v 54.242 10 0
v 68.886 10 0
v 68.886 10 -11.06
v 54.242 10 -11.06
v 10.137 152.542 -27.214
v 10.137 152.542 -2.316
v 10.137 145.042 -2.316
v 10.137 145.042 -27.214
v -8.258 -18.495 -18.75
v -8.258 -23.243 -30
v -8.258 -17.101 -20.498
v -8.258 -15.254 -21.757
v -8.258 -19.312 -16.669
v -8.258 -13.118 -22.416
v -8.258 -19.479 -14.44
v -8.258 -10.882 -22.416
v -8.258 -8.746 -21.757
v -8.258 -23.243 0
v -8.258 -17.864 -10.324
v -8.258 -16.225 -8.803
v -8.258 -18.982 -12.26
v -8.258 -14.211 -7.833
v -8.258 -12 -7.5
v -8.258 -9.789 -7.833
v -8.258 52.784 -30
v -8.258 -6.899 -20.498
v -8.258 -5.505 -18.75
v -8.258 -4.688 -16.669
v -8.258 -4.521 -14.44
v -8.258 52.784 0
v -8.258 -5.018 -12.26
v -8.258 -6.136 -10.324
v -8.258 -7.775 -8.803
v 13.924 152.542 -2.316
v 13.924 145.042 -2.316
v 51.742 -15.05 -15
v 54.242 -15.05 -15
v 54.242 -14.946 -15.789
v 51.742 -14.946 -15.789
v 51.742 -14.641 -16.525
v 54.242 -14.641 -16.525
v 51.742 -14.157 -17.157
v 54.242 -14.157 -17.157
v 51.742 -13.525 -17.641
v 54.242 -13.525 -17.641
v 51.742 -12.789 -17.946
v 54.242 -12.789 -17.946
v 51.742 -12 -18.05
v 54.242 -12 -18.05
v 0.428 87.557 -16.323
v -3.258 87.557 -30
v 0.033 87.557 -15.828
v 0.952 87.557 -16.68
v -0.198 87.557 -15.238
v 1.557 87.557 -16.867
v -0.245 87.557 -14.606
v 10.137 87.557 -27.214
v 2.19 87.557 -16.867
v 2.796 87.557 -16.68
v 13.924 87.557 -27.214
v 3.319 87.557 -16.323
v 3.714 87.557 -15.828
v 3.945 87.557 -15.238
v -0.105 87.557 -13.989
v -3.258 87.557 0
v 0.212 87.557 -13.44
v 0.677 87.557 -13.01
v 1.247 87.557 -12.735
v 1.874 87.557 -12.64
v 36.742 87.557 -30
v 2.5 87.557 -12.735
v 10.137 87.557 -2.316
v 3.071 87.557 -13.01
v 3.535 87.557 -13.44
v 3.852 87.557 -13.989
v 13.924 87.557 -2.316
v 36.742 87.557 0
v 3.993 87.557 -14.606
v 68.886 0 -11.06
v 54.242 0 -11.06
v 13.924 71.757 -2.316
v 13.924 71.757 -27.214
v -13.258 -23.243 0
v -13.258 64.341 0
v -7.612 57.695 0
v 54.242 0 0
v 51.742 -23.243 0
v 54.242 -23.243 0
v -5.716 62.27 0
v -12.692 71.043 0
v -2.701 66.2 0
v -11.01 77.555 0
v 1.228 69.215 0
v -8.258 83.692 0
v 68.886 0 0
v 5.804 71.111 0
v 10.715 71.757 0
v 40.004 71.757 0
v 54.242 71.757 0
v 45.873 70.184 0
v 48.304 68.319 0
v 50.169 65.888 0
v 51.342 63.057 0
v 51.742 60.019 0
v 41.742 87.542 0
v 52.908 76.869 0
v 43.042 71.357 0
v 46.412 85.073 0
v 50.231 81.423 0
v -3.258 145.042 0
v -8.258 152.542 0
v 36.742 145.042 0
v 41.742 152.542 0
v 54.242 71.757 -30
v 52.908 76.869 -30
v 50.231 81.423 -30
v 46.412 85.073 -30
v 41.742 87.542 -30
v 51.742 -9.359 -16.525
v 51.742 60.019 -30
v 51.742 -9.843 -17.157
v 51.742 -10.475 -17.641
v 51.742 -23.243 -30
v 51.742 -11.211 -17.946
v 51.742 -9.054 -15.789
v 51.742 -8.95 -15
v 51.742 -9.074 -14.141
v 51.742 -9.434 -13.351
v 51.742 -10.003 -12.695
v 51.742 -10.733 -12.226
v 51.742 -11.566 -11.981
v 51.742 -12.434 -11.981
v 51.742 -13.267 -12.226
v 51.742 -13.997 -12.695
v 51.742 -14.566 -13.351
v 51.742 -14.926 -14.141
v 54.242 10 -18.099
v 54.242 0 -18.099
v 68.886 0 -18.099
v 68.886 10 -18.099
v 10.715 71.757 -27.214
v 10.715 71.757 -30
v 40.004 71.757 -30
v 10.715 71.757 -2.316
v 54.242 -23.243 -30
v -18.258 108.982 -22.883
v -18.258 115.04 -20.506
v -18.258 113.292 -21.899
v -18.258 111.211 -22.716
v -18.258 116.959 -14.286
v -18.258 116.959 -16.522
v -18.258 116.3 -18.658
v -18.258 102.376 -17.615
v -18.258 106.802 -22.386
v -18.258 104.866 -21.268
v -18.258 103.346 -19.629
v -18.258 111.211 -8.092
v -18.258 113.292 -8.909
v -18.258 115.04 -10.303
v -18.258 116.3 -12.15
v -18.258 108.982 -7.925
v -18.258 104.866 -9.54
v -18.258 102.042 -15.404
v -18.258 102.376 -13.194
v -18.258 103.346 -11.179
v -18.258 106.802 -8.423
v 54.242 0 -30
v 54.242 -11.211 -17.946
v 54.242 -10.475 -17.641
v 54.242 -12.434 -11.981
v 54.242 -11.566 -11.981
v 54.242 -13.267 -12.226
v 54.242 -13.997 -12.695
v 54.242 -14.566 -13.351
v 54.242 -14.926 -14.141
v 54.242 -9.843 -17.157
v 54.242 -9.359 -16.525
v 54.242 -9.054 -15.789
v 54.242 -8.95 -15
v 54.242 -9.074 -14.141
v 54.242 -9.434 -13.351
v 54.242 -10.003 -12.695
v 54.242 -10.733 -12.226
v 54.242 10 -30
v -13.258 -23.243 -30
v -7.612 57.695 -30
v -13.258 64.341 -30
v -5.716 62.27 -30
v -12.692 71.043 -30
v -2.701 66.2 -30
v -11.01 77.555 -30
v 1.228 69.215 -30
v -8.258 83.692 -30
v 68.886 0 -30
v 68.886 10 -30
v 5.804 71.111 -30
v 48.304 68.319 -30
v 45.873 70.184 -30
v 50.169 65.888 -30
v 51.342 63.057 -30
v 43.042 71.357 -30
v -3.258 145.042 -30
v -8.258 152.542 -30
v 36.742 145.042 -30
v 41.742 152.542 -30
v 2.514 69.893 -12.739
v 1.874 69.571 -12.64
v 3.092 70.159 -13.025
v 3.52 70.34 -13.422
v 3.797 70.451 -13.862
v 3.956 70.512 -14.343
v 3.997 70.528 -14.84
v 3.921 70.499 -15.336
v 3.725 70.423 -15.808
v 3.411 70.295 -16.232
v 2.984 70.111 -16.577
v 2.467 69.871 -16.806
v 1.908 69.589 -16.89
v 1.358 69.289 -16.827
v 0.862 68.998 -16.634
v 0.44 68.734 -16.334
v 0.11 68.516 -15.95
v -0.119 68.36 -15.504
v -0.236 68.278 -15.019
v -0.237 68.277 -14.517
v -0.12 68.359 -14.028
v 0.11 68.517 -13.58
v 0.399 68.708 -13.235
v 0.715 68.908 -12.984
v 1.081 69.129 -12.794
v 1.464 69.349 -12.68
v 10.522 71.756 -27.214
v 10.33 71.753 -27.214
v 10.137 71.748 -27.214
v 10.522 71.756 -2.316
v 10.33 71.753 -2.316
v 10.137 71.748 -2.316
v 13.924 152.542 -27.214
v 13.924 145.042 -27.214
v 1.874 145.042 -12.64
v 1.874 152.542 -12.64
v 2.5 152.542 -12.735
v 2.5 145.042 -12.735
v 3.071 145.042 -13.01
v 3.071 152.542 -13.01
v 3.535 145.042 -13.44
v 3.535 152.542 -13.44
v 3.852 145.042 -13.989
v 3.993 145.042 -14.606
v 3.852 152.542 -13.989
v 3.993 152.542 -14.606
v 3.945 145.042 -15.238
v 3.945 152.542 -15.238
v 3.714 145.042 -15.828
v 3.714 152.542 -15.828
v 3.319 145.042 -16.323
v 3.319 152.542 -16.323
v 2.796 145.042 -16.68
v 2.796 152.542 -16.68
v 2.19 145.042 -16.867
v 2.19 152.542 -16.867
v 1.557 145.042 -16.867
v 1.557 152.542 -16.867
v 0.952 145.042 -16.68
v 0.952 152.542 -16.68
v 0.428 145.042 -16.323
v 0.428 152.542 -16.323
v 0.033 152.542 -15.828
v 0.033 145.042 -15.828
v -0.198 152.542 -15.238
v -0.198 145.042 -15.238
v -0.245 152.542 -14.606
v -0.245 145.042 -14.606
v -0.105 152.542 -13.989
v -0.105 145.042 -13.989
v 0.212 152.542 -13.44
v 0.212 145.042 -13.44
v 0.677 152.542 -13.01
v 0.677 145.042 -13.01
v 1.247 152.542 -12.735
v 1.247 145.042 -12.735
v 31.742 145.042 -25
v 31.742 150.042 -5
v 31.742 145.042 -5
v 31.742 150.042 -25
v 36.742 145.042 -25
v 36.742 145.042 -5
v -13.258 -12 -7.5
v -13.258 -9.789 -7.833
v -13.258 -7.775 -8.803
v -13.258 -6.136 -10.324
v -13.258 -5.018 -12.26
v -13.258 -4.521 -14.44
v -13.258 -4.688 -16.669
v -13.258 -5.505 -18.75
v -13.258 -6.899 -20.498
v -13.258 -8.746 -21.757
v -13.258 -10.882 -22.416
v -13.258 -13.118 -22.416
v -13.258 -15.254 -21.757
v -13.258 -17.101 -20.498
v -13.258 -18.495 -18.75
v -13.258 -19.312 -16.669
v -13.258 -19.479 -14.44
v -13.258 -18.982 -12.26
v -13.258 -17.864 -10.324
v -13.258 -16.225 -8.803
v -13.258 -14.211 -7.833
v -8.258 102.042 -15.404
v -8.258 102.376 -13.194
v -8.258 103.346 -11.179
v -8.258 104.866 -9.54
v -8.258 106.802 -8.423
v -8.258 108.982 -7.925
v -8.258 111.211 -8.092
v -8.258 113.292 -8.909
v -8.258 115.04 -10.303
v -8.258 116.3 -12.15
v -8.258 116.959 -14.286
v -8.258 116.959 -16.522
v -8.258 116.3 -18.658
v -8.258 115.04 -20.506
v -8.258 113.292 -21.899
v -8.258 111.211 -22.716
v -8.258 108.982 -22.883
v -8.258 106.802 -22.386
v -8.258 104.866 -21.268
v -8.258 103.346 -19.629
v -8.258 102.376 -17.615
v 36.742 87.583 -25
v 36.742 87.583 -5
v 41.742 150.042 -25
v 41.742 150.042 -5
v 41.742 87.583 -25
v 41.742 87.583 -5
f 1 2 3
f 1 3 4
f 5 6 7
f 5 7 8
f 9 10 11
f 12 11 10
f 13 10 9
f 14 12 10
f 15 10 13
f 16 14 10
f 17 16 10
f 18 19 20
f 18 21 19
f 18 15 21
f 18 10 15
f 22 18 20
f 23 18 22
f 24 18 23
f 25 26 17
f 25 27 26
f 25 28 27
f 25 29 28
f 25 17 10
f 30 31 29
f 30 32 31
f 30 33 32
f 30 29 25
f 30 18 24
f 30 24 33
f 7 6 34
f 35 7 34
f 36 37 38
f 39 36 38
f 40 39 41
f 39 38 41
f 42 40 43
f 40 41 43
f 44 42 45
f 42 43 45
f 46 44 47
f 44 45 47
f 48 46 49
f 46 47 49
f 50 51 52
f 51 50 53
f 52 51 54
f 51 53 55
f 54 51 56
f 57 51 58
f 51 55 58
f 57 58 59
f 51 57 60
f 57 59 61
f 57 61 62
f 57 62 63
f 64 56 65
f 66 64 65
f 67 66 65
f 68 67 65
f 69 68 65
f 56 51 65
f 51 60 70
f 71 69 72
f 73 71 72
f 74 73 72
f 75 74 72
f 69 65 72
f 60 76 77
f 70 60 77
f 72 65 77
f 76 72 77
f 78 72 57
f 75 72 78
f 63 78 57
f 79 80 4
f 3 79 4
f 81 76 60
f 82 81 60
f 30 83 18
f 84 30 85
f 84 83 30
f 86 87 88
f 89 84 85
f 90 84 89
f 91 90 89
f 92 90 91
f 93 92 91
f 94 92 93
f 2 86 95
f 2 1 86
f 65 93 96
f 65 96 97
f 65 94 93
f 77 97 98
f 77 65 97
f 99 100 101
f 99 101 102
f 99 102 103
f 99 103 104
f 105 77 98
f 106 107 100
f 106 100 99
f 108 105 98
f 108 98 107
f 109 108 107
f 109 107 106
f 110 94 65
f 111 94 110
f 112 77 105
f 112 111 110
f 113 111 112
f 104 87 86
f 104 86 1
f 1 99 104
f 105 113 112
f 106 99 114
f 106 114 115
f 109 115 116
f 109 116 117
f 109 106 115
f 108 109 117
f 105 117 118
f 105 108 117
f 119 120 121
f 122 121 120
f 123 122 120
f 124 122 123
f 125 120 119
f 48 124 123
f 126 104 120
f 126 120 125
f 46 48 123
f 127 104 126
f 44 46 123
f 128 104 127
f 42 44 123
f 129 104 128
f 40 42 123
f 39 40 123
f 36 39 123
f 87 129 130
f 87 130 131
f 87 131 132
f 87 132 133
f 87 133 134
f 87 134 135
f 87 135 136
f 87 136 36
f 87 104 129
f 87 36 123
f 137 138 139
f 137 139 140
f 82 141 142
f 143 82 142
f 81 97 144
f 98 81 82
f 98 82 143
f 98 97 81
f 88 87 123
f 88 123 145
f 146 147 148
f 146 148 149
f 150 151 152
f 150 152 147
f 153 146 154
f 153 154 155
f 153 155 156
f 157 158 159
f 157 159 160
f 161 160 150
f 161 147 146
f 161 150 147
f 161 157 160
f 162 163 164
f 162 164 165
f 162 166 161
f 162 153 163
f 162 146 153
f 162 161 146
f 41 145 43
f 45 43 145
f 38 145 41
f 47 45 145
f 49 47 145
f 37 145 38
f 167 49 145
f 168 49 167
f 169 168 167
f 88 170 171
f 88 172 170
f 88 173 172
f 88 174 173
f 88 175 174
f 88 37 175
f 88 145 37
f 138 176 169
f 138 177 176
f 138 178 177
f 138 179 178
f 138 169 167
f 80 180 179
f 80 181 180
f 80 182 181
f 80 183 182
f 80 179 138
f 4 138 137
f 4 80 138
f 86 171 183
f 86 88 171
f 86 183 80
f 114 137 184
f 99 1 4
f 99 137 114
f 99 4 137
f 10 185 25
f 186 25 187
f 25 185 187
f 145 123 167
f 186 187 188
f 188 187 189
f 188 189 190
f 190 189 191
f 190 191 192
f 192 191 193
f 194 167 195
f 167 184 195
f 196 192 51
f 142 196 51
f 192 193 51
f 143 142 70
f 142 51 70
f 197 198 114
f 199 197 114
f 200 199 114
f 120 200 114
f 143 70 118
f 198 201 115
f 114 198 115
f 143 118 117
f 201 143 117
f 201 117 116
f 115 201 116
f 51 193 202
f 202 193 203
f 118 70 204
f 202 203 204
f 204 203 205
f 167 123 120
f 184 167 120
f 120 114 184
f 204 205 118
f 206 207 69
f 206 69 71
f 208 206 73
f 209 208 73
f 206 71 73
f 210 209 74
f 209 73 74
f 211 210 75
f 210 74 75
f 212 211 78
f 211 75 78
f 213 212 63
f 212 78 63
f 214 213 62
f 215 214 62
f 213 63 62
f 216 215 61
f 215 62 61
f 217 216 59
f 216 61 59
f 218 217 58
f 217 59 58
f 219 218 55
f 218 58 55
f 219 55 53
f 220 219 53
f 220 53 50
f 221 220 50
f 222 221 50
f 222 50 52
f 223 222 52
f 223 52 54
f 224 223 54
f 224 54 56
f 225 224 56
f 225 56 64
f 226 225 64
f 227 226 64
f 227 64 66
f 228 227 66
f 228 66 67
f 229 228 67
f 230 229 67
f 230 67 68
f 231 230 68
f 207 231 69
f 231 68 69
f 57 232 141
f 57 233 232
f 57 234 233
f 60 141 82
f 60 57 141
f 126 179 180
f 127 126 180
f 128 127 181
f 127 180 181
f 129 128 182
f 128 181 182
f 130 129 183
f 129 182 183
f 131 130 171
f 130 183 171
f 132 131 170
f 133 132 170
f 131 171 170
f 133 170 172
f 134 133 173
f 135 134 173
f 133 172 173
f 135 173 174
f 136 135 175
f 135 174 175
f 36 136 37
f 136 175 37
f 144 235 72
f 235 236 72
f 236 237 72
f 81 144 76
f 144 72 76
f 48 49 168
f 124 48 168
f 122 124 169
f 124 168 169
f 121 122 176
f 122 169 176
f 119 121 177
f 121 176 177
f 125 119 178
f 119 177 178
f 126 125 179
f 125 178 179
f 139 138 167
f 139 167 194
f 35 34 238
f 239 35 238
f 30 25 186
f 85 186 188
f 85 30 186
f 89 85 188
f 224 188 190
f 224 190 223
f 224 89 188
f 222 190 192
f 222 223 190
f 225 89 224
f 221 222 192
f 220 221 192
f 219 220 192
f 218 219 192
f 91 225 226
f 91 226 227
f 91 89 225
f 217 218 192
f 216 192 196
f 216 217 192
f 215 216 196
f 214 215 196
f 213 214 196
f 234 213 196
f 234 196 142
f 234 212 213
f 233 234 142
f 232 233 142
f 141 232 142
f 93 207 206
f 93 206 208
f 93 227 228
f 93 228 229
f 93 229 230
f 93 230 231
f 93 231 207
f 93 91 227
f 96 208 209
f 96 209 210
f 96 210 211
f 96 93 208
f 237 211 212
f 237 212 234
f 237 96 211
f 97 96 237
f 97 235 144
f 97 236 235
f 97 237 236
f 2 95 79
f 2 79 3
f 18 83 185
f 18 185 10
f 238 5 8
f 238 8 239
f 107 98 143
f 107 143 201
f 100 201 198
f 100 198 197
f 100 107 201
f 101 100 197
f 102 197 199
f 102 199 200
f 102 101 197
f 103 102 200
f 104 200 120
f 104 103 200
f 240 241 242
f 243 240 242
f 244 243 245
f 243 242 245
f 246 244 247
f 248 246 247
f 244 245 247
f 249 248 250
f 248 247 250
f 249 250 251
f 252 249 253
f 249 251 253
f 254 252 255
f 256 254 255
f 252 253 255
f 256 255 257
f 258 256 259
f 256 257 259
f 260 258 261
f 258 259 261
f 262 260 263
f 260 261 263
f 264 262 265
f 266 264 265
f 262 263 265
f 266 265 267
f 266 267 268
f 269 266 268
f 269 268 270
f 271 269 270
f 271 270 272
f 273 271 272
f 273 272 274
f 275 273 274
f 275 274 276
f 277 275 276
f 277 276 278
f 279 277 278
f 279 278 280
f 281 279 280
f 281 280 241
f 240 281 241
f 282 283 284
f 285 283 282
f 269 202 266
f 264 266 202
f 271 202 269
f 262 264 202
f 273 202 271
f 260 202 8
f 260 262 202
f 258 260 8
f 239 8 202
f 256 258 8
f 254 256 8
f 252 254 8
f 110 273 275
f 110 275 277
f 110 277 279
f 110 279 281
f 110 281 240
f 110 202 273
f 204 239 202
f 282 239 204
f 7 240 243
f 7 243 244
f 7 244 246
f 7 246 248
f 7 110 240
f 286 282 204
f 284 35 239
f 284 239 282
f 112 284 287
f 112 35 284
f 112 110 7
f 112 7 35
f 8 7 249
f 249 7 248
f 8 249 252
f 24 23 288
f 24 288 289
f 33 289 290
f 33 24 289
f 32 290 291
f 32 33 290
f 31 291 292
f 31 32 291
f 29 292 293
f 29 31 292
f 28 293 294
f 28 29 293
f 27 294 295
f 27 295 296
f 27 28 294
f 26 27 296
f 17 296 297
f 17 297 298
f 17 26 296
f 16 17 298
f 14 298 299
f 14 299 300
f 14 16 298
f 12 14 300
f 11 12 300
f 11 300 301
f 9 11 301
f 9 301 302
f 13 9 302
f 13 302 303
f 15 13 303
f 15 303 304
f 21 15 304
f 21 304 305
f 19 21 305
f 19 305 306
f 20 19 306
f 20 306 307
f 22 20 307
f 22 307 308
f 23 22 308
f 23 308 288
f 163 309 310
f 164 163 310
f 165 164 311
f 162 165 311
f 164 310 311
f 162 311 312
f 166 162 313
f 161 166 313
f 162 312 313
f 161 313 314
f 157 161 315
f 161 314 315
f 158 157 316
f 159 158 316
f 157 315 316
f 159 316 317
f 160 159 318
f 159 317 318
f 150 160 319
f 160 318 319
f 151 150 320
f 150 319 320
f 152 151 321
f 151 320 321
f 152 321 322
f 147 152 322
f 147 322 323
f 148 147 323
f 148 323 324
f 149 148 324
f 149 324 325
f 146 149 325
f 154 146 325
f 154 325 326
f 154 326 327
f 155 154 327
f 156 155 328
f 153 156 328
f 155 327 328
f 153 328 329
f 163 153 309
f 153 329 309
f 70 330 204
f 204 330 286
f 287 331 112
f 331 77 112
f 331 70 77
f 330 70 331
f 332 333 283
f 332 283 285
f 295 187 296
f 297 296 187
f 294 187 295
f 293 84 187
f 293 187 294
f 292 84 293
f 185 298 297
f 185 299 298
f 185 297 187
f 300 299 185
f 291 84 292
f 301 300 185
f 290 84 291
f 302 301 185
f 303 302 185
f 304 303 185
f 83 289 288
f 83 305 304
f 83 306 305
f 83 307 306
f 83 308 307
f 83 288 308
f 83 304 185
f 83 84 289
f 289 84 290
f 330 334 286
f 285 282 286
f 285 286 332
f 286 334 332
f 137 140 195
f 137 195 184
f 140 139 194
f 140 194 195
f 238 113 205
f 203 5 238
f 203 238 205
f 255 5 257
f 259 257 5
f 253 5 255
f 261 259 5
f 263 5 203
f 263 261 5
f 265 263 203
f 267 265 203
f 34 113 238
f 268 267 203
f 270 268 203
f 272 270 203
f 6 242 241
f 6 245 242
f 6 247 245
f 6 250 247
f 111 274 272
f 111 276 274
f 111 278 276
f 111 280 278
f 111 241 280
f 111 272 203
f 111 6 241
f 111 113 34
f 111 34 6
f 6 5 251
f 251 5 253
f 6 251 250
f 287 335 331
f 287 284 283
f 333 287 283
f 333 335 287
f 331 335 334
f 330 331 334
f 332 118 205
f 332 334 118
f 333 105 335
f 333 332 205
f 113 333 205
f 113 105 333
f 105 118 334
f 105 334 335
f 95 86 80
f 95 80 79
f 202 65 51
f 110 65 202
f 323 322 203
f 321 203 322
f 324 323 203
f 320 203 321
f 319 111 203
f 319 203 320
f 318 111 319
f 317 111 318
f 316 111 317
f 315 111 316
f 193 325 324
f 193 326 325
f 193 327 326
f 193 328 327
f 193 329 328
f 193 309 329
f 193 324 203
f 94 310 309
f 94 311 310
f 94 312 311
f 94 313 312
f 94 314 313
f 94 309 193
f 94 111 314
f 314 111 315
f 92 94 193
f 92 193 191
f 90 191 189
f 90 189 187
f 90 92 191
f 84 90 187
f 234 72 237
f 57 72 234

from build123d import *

# Parameters (mm, degrees)
BOSS_EXTRUDE1_DEPTH = 30
SKETCH8_W           = 20
SKETCH8_H           = 62.459356161
CUT_EXTRUDE10_DEPTH = 10
SKETCH9_W           = 40
SKETCH9_H           = 57.485293174
CUT_EXTRUDE11_DEPTH = 171.042625644
SKETCH10_W          = 3.787442447
SKETCH10_H          = 24.89779836
CUT_EXTRUDE12_DEPTH = 192.169588314
SKETCH11_R          = 7.5
BOSS_EXTRUDE3_DEPTH = 10
SKETCH13_W          = 7.039311569
SKETCH13_H          = 10
CUT_EXTRUDE13_DEPTH = 14.644416288
CUT_EXTRUDE14_DEPTH = 10
CUT_EXTRUDE15_START = -10
SKETCH15_R          = 7.5
SKETCH15_R_2        = 3.05
CUT_EXTRUDE15_DEPTH = 10
SKETCH16_R          = 2.125
CUT_EXTRUDE16_DEPTH = 192.169588314


with BuildPart() as part:
    # Sketch1 → Boss-Extrude1 (new body)
    with BuildSketch(Plane.XY):
        with BuildLine():
            Line((-13.258302459, -23.24297657), (-8.258302459, -23.24297657))
            Line((-8.258302459, -23.24297657), (-8.258302459, 52.783973791))
            ThreePointArc((-8.258302459, 52.783973791), (-2.701224879, 66.199945851), (10.714747181, 71.75702343))
            Line((10.714747181, 71.75702343), (40.003717522, 71.75702343))
            ThreePointArc((40.003717522, 71.75702343), (48.303722791, 68.31904868), (51.741697541, 60.019043411))
            Line((51.741697541, 60.019043411), (51.741697541, -23.24297657))
            Line((51.741697541, -23.24297657), (54.241697541, -23.24297657))
            Line((54.241697541, -23.24297657), (54.241697541, 0))
            Line((54.241697541, 0), (68.88611383, 0))
            Line((68.88611383, 0), (68.88611383, 10))
            Line((68.88611383, 10), (54.241697541, 10))
            Line((54.241697541, 10), (54.241697541, 71.75702343))
            ThreePointArc((54.241697541, 71.75702343), (50.23063048, 81.422678209), (41.741697541, 87.542446084))
            Line((41.741697541, 87.542446084), (41.741697541, 152.542446084))
            Line((41.741697541, 152.542446084), (-8.258302459, 152.542446084))
            Line((-8.258302459, 152.542446084), (-8.258302459, 83.691556541))
            ThreePointArc((-8.258302459, 83.691556541), (-11.988106196, 74.334235436), (-13.258302459, 64.341363194))
            Line((-13.258302459, 64.341363194), (-13.258302459, -23.24297657))
        make_face()
    extrude(amount=-BOSS_EXTRUDE1_DEPTH)

    # Sketch8 → Cut-Extrude10 (cut)
    with BuildSketch(Plane(origin=(41.741697541, 0, 0), x_dir=(0, 0, -1), z_dir=(1, 0, 0))):
        with Locations((15, 118.812768003)):
            Rectangle(SKETCH8_W, SKETCH8_H)
    extrude(amount=-CUT_EXTRUDE10_DEPTH, mode=Mode.SUBTRACT)

    # Sketch9 → Cut-Extrude11 (cut, through all)
    with BuildSketch(Plane.XY):
        with Locations((16.741697541, 116.299799497)):
            Rectangle(SKETCH9_W, SKETCH9_H)
    extrude(amount=-CUT_EXTRUDE11_DEPTH, mode=Mode.SUBTRACT)

    # Sketch10 → Cut-Extrude12 (cut, through all)
    with BuildSketch(Plane(origin=(0, 152.542446084, 0), x_dir=(1, 0, 0), z_dir=(0, 1, 0))):
        with Locations((12.030722262, 14.765280162)):
            Rectangle(SKETCH10_W, SKETCH10_H)
    extrude(amount=-CUT_EXTRUDE12_DEPTH, mode=Mode.SUBTRACT)

    # Sketch11 → Boss-Extrude3 (add)
    with BuildSketch(Plane.ZY.offset(8.258302459)):
        with Locations(Location((-15.40420704, 109.542446084, 0), (0, 0, 270))):
            Circle(SKETCH11_R)
    extrude(amount=BOSS_EXTRUDE3_DEPTH)

    # Sketch13 → Cut-Extrude13 (cut)
    with BuildSketch(Plane(origin=(68.88611383, 0, 0), x_dir=(0, 0, -1), z_dir=(1, 0, 0))):
        with Locations((14.579402423, 5)):
            Rectangle(SKETCH13_W, SKETCH13_H)
    extrude(amount=-CUT_EXTRUDE13_DEPTH, mode=Mode.SUBTRACT)

    # Sketch14 → Cut-Extrude14 (cut)
    with BuildSketch(Plane(origin=(54.241697541, 0, 0), x_dir=(0, 0, -1), z_dir=(1, 0, 0))):
        with BuildLine():
            ThreePointArc((15, -8.95), (11.95, -12), (15, -15.05))
            Line((15, -15.05), (15, -8.95))
        make_face()
        with BuildLine():
            Line((15, -8.95), (15, -15.05))
            ThreePointArc((15, -15.05), (17.156675683, -14.156675683), (18.05, -12))
            ThreePointArc((18.05, -12), (17.156675683, -9.843324317), (15, -8.95))
        make_face()
    extrude(amount=-CUT_EXTRUDE14_DEPTH, mode=Mode.SUBTRACT)

    # Sketch15 → Cut-Extrude15 (cut)
    # profile 1 of 2: a face of its own
    with BuildSketch(Plane.ZY.offset(13.258302459).offset(CUT_EXTRUDE15_START)):
        with Locations((-15, -12)):
            Circle(SKETCH15_R)
        with Locations(Location((-15, -12, 0), (0, 0, 180))):
            Circle(SKETCH15_R_2, mode=Mode.SUBTRACT)
    # profile 2 of 2: a face of its own
    with BuildSketch(Plane.ZY.offset(13.258302459).offset(CUT_EXTRUDE15_START)):
        with Locations(Location((-15, -12, 0), (0, 0, 180))):
            Circle(SKETCH15_R_2)
    extrude(amount=CUT_EXTRUDE15_DEPTH, mode=Mode.SUBTRACT)

    # Sketch16 → Cut-Extrude16 (cut, through all)
    with BuildSketch(Plane(origin=(0, 152.542446084, 0), x_dir=(1, 0, 0), z_dir=(0, 1, 0))):
        with Locations(Location((1.873560728, 14.765280162, 0), (0, 0, 270))):
            Circle(SKETCH16_R)
    extrude(amount=-CUT_EXTRUDE16_DEPTH, mode=Mode.SUBTRACT)


solid = part.part
